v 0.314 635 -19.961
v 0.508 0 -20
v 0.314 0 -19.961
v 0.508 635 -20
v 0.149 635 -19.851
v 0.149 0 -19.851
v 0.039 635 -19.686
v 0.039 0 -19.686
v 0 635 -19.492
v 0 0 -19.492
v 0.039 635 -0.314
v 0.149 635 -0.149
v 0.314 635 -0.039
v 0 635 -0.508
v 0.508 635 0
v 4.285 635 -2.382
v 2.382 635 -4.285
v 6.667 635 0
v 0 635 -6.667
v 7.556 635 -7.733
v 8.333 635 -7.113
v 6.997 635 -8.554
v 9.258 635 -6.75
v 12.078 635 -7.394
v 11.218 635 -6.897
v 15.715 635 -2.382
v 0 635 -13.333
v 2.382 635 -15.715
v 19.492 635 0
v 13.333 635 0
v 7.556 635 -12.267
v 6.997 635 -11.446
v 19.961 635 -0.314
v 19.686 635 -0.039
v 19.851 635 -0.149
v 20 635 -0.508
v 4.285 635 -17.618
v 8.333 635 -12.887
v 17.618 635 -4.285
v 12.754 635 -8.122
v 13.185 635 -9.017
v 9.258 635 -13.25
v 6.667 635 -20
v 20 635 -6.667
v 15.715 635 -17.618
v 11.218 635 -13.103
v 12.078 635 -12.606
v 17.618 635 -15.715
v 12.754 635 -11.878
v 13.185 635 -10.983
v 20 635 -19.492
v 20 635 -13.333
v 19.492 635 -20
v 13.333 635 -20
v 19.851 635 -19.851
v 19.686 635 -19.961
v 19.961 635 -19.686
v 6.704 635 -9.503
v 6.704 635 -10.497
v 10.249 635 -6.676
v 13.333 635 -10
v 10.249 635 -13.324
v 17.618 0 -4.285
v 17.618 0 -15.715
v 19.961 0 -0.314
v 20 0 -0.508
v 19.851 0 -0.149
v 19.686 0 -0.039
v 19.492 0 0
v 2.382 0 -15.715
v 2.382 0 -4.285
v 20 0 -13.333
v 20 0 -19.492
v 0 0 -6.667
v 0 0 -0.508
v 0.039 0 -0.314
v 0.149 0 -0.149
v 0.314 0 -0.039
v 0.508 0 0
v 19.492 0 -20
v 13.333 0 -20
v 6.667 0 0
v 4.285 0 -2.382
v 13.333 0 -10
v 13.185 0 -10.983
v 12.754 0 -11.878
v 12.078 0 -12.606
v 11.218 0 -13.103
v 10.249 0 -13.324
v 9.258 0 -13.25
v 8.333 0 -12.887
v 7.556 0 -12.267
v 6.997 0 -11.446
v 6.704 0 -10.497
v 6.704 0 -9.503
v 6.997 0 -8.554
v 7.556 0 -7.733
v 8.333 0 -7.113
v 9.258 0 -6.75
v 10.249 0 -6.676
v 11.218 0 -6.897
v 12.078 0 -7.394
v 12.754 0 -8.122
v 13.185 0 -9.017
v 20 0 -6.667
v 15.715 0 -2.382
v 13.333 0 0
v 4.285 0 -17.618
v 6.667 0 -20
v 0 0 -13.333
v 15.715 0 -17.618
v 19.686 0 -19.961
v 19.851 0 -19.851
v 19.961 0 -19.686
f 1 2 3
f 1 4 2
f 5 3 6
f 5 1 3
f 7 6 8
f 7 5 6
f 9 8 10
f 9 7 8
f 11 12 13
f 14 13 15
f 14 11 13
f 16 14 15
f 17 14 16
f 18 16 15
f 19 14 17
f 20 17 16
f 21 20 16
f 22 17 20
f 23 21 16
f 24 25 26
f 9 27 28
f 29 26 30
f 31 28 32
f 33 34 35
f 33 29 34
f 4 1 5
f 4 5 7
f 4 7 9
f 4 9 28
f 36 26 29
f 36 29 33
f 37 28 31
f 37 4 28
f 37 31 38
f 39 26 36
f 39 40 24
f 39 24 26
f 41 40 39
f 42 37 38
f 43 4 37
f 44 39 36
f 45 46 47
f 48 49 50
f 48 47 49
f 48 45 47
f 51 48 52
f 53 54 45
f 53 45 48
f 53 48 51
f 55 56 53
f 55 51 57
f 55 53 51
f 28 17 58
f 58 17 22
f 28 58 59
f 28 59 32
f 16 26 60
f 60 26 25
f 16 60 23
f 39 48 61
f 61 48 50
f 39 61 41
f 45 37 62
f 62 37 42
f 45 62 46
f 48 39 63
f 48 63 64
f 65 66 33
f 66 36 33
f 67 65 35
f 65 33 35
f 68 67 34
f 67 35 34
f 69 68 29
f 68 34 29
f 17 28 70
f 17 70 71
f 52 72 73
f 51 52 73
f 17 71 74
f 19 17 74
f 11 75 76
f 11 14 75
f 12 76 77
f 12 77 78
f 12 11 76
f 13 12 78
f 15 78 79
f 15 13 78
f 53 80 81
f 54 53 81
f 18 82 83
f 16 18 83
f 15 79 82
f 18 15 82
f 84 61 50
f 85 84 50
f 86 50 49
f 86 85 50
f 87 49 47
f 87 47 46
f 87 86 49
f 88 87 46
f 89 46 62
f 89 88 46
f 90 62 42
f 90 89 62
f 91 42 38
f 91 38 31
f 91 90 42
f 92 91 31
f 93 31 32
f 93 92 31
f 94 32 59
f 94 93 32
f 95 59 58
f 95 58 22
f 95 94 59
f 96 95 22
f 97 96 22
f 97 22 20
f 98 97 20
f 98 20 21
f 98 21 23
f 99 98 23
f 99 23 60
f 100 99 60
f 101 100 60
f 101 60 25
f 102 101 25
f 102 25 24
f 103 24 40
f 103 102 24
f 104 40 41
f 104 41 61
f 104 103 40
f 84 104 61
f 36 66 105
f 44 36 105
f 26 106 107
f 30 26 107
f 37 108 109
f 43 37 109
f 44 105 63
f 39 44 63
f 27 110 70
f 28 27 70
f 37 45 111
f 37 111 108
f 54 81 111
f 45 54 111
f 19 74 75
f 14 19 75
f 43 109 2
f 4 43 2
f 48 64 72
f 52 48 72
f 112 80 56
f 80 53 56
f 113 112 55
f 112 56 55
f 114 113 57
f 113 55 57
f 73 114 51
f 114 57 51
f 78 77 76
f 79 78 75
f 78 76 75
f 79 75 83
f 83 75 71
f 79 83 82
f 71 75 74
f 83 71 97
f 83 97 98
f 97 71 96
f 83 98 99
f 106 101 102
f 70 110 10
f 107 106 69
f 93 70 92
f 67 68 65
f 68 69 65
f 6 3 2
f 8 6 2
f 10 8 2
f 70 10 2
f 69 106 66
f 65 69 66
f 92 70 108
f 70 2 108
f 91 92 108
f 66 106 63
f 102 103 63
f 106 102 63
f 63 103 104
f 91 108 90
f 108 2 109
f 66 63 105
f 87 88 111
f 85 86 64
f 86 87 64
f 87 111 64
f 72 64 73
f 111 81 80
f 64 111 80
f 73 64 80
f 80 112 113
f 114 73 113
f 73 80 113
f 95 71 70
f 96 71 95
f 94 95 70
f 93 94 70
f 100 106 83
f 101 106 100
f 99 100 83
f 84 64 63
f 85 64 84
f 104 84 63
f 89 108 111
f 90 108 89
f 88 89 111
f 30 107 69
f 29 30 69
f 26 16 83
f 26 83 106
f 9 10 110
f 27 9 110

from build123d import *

# Parameters (mm, degrees)
SKETCH1_R           = 3.333333333
BOSS_EXTRUDE1_DEPTH = 635
FILLET4_R           = 0.508


with BuildPart() as part:
    # Sketch1 → Boss-Extrude1 (new body)
    with BuildSketch(Plane(origin=(0, 0, 0), x_dir=(1, 0, 0), z_dir=(0, 1, 0))):
        Polygon((4.285, 17.618333333), (6.666666667, 20), (0, 20), (0, 13.333333333), (2.381666667, 15.715), (2.381666667, 4.285), (0, 6.666666667), (0, 0), (6.666666667, 0), (4.285, 2.381666667), (15.715, 2.381666667), (13.333333333, 0), (20, 0), (20, 6.666666667), (17.618333333, 4.285), (17.618333333, 15.715), (20, 13.333333333), (20, 20), (13.333333333, 20), (15.715, 17.618333333), align=None)
        with Locations((10, 10)):
            Circle(SKETCH1_R, mode=Mode.SUBTRACT)
    extrude(amount=BOSS_EXTRUDE1_DEPTH)

    # Fillet4
    fillet4_edges = [part.edges().sort_by_distance(p)[0] for p in [
        (20, 317.5, 0),
        (0, 317.5, 0),
        (0, 317.5, -20),
        (20, 317.5, -20),
    ]]
    fillet(fillet4_edges, radius=FILLET4_R)


solid = part.part
